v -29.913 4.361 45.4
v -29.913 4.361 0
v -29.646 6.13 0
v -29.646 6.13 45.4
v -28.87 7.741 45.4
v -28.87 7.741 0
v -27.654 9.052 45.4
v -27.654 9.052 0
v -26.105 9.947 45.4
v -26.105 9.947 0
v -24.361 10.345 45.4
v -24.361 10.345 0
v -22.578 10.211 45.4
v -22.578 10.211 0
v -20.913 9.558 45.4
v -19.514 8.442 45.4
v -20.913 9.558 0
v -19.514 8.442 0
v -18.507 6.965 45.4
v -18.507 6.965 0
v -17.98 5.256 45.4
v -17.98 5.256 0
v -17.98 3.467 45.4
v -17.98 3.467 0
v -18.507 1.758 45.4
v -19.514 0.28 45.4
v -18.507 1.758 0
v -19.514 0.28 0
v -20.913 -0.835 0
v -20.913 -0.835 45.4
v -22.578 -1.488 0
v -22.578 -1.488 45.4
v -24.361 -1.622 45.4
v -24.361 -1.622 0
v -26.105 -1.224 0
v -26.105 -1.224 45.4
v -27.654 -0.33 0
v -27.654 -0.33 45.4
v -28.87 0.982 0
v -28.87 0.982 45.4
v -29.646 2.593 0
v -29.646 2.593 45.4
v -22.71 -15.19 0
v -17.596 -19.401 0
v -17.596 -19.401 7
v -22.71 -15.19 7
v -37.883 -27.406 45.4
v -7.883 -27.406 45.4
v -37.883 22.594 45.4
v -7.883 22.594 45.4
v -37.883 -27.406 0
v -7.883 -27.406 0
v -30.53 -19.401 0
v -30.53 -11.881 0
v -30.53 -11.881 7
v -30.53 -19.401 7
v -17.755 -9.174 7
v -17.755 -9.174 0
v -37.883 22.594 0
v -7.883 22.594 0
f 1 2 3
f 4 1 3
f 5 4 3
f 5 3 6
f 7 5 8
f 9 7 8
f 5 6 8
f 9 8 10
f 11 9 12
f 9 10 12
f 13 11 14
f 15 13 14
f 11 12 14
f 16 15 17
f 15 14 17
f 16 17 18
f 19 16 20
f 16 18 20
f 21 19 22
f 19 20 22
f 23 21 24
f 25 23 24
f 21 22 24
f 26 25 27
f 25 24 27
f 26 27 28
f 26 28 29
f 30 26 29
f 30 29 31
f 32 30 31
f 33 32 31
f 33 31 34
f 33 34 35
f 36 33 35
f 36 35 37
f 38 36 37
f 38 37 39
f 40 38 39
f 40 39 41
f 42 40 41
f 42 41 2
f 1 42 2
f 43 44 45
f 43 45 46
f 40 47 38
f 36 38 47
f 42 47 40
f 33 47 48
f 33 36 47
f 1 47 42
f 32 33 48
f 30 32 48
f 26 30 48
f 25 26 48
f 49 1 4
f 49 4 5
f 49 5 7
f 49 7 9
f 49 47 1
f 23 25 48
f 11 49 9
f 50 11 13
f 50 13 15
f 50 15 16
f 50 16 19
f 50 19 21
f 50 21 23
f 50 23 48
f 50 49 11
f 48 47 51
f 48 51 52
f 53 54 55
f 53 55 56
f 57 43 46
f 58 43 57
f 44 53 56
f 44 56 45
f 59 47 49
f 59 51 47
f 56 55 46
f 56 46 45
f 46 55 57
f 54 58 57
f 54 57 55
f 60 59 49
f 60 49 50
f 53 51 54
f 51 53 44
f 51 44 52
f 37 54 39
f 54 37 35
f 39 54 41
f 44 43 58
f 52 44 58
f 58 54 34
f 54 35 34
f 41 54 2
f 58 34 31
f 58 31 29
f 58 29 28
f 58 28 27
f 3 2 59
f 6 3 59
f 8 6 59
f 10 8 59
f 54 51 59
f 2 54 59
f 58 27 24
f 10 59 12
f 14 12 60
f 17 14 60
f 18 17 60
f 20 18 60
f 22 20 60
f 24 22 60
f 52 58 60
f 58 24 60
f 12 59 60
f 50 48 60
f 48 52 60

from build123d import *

# Parameters (mm, degrees)
F0_W      = 30
F0_H      = 50
F1_DEPTH  = 25.4
F1_FACE_W = 30
F1_FACE_H = 50
F2_DEPTH  = 20
F4_D      = 12
F6_DEPTH  = 7


with BuildPart() as f1:
    # F0 (on Top) → F1 (new body)
    with BuildSketch(Plane.XY):
        with Locations((-22.883214, -2.406316)):
            Rectangle(F0_W, F0_H)
    extrude(amount=F1_DEPTH)

    # F1_face (on face) → F2 (join)
    with BuildSketch(Plane(origin=(-22.883214, -2.406316, 25.4), x_dir=(1, 0, 0), z_dir=(0, 0, 1))):
        Rectangle(F1_FACE_W, F1_FACE_H)
    extrude(amount=F2_DEPTH)

    # F4 (through all)
    with Locations(Plane.XY.offset(45.4)):
        with Locations((-23.912763, 4.361447)):
            Hole(F4_D / 2)

    # F5 (on Top) → F6 (cut)
    with BuildSketch(Plane.XY):
        Polygon((-17.755329, -9.173958), (-30.53013, -11.881185), (-30.53013, -19.400921), (-22.709606, -19.400921), (-17.596183, -19.400921), (-22.709606, -15.189869), align=None)
    extrude(amount=F6_DEPTH, mode=Mode.SUBTRACT)


solid = f1.part
